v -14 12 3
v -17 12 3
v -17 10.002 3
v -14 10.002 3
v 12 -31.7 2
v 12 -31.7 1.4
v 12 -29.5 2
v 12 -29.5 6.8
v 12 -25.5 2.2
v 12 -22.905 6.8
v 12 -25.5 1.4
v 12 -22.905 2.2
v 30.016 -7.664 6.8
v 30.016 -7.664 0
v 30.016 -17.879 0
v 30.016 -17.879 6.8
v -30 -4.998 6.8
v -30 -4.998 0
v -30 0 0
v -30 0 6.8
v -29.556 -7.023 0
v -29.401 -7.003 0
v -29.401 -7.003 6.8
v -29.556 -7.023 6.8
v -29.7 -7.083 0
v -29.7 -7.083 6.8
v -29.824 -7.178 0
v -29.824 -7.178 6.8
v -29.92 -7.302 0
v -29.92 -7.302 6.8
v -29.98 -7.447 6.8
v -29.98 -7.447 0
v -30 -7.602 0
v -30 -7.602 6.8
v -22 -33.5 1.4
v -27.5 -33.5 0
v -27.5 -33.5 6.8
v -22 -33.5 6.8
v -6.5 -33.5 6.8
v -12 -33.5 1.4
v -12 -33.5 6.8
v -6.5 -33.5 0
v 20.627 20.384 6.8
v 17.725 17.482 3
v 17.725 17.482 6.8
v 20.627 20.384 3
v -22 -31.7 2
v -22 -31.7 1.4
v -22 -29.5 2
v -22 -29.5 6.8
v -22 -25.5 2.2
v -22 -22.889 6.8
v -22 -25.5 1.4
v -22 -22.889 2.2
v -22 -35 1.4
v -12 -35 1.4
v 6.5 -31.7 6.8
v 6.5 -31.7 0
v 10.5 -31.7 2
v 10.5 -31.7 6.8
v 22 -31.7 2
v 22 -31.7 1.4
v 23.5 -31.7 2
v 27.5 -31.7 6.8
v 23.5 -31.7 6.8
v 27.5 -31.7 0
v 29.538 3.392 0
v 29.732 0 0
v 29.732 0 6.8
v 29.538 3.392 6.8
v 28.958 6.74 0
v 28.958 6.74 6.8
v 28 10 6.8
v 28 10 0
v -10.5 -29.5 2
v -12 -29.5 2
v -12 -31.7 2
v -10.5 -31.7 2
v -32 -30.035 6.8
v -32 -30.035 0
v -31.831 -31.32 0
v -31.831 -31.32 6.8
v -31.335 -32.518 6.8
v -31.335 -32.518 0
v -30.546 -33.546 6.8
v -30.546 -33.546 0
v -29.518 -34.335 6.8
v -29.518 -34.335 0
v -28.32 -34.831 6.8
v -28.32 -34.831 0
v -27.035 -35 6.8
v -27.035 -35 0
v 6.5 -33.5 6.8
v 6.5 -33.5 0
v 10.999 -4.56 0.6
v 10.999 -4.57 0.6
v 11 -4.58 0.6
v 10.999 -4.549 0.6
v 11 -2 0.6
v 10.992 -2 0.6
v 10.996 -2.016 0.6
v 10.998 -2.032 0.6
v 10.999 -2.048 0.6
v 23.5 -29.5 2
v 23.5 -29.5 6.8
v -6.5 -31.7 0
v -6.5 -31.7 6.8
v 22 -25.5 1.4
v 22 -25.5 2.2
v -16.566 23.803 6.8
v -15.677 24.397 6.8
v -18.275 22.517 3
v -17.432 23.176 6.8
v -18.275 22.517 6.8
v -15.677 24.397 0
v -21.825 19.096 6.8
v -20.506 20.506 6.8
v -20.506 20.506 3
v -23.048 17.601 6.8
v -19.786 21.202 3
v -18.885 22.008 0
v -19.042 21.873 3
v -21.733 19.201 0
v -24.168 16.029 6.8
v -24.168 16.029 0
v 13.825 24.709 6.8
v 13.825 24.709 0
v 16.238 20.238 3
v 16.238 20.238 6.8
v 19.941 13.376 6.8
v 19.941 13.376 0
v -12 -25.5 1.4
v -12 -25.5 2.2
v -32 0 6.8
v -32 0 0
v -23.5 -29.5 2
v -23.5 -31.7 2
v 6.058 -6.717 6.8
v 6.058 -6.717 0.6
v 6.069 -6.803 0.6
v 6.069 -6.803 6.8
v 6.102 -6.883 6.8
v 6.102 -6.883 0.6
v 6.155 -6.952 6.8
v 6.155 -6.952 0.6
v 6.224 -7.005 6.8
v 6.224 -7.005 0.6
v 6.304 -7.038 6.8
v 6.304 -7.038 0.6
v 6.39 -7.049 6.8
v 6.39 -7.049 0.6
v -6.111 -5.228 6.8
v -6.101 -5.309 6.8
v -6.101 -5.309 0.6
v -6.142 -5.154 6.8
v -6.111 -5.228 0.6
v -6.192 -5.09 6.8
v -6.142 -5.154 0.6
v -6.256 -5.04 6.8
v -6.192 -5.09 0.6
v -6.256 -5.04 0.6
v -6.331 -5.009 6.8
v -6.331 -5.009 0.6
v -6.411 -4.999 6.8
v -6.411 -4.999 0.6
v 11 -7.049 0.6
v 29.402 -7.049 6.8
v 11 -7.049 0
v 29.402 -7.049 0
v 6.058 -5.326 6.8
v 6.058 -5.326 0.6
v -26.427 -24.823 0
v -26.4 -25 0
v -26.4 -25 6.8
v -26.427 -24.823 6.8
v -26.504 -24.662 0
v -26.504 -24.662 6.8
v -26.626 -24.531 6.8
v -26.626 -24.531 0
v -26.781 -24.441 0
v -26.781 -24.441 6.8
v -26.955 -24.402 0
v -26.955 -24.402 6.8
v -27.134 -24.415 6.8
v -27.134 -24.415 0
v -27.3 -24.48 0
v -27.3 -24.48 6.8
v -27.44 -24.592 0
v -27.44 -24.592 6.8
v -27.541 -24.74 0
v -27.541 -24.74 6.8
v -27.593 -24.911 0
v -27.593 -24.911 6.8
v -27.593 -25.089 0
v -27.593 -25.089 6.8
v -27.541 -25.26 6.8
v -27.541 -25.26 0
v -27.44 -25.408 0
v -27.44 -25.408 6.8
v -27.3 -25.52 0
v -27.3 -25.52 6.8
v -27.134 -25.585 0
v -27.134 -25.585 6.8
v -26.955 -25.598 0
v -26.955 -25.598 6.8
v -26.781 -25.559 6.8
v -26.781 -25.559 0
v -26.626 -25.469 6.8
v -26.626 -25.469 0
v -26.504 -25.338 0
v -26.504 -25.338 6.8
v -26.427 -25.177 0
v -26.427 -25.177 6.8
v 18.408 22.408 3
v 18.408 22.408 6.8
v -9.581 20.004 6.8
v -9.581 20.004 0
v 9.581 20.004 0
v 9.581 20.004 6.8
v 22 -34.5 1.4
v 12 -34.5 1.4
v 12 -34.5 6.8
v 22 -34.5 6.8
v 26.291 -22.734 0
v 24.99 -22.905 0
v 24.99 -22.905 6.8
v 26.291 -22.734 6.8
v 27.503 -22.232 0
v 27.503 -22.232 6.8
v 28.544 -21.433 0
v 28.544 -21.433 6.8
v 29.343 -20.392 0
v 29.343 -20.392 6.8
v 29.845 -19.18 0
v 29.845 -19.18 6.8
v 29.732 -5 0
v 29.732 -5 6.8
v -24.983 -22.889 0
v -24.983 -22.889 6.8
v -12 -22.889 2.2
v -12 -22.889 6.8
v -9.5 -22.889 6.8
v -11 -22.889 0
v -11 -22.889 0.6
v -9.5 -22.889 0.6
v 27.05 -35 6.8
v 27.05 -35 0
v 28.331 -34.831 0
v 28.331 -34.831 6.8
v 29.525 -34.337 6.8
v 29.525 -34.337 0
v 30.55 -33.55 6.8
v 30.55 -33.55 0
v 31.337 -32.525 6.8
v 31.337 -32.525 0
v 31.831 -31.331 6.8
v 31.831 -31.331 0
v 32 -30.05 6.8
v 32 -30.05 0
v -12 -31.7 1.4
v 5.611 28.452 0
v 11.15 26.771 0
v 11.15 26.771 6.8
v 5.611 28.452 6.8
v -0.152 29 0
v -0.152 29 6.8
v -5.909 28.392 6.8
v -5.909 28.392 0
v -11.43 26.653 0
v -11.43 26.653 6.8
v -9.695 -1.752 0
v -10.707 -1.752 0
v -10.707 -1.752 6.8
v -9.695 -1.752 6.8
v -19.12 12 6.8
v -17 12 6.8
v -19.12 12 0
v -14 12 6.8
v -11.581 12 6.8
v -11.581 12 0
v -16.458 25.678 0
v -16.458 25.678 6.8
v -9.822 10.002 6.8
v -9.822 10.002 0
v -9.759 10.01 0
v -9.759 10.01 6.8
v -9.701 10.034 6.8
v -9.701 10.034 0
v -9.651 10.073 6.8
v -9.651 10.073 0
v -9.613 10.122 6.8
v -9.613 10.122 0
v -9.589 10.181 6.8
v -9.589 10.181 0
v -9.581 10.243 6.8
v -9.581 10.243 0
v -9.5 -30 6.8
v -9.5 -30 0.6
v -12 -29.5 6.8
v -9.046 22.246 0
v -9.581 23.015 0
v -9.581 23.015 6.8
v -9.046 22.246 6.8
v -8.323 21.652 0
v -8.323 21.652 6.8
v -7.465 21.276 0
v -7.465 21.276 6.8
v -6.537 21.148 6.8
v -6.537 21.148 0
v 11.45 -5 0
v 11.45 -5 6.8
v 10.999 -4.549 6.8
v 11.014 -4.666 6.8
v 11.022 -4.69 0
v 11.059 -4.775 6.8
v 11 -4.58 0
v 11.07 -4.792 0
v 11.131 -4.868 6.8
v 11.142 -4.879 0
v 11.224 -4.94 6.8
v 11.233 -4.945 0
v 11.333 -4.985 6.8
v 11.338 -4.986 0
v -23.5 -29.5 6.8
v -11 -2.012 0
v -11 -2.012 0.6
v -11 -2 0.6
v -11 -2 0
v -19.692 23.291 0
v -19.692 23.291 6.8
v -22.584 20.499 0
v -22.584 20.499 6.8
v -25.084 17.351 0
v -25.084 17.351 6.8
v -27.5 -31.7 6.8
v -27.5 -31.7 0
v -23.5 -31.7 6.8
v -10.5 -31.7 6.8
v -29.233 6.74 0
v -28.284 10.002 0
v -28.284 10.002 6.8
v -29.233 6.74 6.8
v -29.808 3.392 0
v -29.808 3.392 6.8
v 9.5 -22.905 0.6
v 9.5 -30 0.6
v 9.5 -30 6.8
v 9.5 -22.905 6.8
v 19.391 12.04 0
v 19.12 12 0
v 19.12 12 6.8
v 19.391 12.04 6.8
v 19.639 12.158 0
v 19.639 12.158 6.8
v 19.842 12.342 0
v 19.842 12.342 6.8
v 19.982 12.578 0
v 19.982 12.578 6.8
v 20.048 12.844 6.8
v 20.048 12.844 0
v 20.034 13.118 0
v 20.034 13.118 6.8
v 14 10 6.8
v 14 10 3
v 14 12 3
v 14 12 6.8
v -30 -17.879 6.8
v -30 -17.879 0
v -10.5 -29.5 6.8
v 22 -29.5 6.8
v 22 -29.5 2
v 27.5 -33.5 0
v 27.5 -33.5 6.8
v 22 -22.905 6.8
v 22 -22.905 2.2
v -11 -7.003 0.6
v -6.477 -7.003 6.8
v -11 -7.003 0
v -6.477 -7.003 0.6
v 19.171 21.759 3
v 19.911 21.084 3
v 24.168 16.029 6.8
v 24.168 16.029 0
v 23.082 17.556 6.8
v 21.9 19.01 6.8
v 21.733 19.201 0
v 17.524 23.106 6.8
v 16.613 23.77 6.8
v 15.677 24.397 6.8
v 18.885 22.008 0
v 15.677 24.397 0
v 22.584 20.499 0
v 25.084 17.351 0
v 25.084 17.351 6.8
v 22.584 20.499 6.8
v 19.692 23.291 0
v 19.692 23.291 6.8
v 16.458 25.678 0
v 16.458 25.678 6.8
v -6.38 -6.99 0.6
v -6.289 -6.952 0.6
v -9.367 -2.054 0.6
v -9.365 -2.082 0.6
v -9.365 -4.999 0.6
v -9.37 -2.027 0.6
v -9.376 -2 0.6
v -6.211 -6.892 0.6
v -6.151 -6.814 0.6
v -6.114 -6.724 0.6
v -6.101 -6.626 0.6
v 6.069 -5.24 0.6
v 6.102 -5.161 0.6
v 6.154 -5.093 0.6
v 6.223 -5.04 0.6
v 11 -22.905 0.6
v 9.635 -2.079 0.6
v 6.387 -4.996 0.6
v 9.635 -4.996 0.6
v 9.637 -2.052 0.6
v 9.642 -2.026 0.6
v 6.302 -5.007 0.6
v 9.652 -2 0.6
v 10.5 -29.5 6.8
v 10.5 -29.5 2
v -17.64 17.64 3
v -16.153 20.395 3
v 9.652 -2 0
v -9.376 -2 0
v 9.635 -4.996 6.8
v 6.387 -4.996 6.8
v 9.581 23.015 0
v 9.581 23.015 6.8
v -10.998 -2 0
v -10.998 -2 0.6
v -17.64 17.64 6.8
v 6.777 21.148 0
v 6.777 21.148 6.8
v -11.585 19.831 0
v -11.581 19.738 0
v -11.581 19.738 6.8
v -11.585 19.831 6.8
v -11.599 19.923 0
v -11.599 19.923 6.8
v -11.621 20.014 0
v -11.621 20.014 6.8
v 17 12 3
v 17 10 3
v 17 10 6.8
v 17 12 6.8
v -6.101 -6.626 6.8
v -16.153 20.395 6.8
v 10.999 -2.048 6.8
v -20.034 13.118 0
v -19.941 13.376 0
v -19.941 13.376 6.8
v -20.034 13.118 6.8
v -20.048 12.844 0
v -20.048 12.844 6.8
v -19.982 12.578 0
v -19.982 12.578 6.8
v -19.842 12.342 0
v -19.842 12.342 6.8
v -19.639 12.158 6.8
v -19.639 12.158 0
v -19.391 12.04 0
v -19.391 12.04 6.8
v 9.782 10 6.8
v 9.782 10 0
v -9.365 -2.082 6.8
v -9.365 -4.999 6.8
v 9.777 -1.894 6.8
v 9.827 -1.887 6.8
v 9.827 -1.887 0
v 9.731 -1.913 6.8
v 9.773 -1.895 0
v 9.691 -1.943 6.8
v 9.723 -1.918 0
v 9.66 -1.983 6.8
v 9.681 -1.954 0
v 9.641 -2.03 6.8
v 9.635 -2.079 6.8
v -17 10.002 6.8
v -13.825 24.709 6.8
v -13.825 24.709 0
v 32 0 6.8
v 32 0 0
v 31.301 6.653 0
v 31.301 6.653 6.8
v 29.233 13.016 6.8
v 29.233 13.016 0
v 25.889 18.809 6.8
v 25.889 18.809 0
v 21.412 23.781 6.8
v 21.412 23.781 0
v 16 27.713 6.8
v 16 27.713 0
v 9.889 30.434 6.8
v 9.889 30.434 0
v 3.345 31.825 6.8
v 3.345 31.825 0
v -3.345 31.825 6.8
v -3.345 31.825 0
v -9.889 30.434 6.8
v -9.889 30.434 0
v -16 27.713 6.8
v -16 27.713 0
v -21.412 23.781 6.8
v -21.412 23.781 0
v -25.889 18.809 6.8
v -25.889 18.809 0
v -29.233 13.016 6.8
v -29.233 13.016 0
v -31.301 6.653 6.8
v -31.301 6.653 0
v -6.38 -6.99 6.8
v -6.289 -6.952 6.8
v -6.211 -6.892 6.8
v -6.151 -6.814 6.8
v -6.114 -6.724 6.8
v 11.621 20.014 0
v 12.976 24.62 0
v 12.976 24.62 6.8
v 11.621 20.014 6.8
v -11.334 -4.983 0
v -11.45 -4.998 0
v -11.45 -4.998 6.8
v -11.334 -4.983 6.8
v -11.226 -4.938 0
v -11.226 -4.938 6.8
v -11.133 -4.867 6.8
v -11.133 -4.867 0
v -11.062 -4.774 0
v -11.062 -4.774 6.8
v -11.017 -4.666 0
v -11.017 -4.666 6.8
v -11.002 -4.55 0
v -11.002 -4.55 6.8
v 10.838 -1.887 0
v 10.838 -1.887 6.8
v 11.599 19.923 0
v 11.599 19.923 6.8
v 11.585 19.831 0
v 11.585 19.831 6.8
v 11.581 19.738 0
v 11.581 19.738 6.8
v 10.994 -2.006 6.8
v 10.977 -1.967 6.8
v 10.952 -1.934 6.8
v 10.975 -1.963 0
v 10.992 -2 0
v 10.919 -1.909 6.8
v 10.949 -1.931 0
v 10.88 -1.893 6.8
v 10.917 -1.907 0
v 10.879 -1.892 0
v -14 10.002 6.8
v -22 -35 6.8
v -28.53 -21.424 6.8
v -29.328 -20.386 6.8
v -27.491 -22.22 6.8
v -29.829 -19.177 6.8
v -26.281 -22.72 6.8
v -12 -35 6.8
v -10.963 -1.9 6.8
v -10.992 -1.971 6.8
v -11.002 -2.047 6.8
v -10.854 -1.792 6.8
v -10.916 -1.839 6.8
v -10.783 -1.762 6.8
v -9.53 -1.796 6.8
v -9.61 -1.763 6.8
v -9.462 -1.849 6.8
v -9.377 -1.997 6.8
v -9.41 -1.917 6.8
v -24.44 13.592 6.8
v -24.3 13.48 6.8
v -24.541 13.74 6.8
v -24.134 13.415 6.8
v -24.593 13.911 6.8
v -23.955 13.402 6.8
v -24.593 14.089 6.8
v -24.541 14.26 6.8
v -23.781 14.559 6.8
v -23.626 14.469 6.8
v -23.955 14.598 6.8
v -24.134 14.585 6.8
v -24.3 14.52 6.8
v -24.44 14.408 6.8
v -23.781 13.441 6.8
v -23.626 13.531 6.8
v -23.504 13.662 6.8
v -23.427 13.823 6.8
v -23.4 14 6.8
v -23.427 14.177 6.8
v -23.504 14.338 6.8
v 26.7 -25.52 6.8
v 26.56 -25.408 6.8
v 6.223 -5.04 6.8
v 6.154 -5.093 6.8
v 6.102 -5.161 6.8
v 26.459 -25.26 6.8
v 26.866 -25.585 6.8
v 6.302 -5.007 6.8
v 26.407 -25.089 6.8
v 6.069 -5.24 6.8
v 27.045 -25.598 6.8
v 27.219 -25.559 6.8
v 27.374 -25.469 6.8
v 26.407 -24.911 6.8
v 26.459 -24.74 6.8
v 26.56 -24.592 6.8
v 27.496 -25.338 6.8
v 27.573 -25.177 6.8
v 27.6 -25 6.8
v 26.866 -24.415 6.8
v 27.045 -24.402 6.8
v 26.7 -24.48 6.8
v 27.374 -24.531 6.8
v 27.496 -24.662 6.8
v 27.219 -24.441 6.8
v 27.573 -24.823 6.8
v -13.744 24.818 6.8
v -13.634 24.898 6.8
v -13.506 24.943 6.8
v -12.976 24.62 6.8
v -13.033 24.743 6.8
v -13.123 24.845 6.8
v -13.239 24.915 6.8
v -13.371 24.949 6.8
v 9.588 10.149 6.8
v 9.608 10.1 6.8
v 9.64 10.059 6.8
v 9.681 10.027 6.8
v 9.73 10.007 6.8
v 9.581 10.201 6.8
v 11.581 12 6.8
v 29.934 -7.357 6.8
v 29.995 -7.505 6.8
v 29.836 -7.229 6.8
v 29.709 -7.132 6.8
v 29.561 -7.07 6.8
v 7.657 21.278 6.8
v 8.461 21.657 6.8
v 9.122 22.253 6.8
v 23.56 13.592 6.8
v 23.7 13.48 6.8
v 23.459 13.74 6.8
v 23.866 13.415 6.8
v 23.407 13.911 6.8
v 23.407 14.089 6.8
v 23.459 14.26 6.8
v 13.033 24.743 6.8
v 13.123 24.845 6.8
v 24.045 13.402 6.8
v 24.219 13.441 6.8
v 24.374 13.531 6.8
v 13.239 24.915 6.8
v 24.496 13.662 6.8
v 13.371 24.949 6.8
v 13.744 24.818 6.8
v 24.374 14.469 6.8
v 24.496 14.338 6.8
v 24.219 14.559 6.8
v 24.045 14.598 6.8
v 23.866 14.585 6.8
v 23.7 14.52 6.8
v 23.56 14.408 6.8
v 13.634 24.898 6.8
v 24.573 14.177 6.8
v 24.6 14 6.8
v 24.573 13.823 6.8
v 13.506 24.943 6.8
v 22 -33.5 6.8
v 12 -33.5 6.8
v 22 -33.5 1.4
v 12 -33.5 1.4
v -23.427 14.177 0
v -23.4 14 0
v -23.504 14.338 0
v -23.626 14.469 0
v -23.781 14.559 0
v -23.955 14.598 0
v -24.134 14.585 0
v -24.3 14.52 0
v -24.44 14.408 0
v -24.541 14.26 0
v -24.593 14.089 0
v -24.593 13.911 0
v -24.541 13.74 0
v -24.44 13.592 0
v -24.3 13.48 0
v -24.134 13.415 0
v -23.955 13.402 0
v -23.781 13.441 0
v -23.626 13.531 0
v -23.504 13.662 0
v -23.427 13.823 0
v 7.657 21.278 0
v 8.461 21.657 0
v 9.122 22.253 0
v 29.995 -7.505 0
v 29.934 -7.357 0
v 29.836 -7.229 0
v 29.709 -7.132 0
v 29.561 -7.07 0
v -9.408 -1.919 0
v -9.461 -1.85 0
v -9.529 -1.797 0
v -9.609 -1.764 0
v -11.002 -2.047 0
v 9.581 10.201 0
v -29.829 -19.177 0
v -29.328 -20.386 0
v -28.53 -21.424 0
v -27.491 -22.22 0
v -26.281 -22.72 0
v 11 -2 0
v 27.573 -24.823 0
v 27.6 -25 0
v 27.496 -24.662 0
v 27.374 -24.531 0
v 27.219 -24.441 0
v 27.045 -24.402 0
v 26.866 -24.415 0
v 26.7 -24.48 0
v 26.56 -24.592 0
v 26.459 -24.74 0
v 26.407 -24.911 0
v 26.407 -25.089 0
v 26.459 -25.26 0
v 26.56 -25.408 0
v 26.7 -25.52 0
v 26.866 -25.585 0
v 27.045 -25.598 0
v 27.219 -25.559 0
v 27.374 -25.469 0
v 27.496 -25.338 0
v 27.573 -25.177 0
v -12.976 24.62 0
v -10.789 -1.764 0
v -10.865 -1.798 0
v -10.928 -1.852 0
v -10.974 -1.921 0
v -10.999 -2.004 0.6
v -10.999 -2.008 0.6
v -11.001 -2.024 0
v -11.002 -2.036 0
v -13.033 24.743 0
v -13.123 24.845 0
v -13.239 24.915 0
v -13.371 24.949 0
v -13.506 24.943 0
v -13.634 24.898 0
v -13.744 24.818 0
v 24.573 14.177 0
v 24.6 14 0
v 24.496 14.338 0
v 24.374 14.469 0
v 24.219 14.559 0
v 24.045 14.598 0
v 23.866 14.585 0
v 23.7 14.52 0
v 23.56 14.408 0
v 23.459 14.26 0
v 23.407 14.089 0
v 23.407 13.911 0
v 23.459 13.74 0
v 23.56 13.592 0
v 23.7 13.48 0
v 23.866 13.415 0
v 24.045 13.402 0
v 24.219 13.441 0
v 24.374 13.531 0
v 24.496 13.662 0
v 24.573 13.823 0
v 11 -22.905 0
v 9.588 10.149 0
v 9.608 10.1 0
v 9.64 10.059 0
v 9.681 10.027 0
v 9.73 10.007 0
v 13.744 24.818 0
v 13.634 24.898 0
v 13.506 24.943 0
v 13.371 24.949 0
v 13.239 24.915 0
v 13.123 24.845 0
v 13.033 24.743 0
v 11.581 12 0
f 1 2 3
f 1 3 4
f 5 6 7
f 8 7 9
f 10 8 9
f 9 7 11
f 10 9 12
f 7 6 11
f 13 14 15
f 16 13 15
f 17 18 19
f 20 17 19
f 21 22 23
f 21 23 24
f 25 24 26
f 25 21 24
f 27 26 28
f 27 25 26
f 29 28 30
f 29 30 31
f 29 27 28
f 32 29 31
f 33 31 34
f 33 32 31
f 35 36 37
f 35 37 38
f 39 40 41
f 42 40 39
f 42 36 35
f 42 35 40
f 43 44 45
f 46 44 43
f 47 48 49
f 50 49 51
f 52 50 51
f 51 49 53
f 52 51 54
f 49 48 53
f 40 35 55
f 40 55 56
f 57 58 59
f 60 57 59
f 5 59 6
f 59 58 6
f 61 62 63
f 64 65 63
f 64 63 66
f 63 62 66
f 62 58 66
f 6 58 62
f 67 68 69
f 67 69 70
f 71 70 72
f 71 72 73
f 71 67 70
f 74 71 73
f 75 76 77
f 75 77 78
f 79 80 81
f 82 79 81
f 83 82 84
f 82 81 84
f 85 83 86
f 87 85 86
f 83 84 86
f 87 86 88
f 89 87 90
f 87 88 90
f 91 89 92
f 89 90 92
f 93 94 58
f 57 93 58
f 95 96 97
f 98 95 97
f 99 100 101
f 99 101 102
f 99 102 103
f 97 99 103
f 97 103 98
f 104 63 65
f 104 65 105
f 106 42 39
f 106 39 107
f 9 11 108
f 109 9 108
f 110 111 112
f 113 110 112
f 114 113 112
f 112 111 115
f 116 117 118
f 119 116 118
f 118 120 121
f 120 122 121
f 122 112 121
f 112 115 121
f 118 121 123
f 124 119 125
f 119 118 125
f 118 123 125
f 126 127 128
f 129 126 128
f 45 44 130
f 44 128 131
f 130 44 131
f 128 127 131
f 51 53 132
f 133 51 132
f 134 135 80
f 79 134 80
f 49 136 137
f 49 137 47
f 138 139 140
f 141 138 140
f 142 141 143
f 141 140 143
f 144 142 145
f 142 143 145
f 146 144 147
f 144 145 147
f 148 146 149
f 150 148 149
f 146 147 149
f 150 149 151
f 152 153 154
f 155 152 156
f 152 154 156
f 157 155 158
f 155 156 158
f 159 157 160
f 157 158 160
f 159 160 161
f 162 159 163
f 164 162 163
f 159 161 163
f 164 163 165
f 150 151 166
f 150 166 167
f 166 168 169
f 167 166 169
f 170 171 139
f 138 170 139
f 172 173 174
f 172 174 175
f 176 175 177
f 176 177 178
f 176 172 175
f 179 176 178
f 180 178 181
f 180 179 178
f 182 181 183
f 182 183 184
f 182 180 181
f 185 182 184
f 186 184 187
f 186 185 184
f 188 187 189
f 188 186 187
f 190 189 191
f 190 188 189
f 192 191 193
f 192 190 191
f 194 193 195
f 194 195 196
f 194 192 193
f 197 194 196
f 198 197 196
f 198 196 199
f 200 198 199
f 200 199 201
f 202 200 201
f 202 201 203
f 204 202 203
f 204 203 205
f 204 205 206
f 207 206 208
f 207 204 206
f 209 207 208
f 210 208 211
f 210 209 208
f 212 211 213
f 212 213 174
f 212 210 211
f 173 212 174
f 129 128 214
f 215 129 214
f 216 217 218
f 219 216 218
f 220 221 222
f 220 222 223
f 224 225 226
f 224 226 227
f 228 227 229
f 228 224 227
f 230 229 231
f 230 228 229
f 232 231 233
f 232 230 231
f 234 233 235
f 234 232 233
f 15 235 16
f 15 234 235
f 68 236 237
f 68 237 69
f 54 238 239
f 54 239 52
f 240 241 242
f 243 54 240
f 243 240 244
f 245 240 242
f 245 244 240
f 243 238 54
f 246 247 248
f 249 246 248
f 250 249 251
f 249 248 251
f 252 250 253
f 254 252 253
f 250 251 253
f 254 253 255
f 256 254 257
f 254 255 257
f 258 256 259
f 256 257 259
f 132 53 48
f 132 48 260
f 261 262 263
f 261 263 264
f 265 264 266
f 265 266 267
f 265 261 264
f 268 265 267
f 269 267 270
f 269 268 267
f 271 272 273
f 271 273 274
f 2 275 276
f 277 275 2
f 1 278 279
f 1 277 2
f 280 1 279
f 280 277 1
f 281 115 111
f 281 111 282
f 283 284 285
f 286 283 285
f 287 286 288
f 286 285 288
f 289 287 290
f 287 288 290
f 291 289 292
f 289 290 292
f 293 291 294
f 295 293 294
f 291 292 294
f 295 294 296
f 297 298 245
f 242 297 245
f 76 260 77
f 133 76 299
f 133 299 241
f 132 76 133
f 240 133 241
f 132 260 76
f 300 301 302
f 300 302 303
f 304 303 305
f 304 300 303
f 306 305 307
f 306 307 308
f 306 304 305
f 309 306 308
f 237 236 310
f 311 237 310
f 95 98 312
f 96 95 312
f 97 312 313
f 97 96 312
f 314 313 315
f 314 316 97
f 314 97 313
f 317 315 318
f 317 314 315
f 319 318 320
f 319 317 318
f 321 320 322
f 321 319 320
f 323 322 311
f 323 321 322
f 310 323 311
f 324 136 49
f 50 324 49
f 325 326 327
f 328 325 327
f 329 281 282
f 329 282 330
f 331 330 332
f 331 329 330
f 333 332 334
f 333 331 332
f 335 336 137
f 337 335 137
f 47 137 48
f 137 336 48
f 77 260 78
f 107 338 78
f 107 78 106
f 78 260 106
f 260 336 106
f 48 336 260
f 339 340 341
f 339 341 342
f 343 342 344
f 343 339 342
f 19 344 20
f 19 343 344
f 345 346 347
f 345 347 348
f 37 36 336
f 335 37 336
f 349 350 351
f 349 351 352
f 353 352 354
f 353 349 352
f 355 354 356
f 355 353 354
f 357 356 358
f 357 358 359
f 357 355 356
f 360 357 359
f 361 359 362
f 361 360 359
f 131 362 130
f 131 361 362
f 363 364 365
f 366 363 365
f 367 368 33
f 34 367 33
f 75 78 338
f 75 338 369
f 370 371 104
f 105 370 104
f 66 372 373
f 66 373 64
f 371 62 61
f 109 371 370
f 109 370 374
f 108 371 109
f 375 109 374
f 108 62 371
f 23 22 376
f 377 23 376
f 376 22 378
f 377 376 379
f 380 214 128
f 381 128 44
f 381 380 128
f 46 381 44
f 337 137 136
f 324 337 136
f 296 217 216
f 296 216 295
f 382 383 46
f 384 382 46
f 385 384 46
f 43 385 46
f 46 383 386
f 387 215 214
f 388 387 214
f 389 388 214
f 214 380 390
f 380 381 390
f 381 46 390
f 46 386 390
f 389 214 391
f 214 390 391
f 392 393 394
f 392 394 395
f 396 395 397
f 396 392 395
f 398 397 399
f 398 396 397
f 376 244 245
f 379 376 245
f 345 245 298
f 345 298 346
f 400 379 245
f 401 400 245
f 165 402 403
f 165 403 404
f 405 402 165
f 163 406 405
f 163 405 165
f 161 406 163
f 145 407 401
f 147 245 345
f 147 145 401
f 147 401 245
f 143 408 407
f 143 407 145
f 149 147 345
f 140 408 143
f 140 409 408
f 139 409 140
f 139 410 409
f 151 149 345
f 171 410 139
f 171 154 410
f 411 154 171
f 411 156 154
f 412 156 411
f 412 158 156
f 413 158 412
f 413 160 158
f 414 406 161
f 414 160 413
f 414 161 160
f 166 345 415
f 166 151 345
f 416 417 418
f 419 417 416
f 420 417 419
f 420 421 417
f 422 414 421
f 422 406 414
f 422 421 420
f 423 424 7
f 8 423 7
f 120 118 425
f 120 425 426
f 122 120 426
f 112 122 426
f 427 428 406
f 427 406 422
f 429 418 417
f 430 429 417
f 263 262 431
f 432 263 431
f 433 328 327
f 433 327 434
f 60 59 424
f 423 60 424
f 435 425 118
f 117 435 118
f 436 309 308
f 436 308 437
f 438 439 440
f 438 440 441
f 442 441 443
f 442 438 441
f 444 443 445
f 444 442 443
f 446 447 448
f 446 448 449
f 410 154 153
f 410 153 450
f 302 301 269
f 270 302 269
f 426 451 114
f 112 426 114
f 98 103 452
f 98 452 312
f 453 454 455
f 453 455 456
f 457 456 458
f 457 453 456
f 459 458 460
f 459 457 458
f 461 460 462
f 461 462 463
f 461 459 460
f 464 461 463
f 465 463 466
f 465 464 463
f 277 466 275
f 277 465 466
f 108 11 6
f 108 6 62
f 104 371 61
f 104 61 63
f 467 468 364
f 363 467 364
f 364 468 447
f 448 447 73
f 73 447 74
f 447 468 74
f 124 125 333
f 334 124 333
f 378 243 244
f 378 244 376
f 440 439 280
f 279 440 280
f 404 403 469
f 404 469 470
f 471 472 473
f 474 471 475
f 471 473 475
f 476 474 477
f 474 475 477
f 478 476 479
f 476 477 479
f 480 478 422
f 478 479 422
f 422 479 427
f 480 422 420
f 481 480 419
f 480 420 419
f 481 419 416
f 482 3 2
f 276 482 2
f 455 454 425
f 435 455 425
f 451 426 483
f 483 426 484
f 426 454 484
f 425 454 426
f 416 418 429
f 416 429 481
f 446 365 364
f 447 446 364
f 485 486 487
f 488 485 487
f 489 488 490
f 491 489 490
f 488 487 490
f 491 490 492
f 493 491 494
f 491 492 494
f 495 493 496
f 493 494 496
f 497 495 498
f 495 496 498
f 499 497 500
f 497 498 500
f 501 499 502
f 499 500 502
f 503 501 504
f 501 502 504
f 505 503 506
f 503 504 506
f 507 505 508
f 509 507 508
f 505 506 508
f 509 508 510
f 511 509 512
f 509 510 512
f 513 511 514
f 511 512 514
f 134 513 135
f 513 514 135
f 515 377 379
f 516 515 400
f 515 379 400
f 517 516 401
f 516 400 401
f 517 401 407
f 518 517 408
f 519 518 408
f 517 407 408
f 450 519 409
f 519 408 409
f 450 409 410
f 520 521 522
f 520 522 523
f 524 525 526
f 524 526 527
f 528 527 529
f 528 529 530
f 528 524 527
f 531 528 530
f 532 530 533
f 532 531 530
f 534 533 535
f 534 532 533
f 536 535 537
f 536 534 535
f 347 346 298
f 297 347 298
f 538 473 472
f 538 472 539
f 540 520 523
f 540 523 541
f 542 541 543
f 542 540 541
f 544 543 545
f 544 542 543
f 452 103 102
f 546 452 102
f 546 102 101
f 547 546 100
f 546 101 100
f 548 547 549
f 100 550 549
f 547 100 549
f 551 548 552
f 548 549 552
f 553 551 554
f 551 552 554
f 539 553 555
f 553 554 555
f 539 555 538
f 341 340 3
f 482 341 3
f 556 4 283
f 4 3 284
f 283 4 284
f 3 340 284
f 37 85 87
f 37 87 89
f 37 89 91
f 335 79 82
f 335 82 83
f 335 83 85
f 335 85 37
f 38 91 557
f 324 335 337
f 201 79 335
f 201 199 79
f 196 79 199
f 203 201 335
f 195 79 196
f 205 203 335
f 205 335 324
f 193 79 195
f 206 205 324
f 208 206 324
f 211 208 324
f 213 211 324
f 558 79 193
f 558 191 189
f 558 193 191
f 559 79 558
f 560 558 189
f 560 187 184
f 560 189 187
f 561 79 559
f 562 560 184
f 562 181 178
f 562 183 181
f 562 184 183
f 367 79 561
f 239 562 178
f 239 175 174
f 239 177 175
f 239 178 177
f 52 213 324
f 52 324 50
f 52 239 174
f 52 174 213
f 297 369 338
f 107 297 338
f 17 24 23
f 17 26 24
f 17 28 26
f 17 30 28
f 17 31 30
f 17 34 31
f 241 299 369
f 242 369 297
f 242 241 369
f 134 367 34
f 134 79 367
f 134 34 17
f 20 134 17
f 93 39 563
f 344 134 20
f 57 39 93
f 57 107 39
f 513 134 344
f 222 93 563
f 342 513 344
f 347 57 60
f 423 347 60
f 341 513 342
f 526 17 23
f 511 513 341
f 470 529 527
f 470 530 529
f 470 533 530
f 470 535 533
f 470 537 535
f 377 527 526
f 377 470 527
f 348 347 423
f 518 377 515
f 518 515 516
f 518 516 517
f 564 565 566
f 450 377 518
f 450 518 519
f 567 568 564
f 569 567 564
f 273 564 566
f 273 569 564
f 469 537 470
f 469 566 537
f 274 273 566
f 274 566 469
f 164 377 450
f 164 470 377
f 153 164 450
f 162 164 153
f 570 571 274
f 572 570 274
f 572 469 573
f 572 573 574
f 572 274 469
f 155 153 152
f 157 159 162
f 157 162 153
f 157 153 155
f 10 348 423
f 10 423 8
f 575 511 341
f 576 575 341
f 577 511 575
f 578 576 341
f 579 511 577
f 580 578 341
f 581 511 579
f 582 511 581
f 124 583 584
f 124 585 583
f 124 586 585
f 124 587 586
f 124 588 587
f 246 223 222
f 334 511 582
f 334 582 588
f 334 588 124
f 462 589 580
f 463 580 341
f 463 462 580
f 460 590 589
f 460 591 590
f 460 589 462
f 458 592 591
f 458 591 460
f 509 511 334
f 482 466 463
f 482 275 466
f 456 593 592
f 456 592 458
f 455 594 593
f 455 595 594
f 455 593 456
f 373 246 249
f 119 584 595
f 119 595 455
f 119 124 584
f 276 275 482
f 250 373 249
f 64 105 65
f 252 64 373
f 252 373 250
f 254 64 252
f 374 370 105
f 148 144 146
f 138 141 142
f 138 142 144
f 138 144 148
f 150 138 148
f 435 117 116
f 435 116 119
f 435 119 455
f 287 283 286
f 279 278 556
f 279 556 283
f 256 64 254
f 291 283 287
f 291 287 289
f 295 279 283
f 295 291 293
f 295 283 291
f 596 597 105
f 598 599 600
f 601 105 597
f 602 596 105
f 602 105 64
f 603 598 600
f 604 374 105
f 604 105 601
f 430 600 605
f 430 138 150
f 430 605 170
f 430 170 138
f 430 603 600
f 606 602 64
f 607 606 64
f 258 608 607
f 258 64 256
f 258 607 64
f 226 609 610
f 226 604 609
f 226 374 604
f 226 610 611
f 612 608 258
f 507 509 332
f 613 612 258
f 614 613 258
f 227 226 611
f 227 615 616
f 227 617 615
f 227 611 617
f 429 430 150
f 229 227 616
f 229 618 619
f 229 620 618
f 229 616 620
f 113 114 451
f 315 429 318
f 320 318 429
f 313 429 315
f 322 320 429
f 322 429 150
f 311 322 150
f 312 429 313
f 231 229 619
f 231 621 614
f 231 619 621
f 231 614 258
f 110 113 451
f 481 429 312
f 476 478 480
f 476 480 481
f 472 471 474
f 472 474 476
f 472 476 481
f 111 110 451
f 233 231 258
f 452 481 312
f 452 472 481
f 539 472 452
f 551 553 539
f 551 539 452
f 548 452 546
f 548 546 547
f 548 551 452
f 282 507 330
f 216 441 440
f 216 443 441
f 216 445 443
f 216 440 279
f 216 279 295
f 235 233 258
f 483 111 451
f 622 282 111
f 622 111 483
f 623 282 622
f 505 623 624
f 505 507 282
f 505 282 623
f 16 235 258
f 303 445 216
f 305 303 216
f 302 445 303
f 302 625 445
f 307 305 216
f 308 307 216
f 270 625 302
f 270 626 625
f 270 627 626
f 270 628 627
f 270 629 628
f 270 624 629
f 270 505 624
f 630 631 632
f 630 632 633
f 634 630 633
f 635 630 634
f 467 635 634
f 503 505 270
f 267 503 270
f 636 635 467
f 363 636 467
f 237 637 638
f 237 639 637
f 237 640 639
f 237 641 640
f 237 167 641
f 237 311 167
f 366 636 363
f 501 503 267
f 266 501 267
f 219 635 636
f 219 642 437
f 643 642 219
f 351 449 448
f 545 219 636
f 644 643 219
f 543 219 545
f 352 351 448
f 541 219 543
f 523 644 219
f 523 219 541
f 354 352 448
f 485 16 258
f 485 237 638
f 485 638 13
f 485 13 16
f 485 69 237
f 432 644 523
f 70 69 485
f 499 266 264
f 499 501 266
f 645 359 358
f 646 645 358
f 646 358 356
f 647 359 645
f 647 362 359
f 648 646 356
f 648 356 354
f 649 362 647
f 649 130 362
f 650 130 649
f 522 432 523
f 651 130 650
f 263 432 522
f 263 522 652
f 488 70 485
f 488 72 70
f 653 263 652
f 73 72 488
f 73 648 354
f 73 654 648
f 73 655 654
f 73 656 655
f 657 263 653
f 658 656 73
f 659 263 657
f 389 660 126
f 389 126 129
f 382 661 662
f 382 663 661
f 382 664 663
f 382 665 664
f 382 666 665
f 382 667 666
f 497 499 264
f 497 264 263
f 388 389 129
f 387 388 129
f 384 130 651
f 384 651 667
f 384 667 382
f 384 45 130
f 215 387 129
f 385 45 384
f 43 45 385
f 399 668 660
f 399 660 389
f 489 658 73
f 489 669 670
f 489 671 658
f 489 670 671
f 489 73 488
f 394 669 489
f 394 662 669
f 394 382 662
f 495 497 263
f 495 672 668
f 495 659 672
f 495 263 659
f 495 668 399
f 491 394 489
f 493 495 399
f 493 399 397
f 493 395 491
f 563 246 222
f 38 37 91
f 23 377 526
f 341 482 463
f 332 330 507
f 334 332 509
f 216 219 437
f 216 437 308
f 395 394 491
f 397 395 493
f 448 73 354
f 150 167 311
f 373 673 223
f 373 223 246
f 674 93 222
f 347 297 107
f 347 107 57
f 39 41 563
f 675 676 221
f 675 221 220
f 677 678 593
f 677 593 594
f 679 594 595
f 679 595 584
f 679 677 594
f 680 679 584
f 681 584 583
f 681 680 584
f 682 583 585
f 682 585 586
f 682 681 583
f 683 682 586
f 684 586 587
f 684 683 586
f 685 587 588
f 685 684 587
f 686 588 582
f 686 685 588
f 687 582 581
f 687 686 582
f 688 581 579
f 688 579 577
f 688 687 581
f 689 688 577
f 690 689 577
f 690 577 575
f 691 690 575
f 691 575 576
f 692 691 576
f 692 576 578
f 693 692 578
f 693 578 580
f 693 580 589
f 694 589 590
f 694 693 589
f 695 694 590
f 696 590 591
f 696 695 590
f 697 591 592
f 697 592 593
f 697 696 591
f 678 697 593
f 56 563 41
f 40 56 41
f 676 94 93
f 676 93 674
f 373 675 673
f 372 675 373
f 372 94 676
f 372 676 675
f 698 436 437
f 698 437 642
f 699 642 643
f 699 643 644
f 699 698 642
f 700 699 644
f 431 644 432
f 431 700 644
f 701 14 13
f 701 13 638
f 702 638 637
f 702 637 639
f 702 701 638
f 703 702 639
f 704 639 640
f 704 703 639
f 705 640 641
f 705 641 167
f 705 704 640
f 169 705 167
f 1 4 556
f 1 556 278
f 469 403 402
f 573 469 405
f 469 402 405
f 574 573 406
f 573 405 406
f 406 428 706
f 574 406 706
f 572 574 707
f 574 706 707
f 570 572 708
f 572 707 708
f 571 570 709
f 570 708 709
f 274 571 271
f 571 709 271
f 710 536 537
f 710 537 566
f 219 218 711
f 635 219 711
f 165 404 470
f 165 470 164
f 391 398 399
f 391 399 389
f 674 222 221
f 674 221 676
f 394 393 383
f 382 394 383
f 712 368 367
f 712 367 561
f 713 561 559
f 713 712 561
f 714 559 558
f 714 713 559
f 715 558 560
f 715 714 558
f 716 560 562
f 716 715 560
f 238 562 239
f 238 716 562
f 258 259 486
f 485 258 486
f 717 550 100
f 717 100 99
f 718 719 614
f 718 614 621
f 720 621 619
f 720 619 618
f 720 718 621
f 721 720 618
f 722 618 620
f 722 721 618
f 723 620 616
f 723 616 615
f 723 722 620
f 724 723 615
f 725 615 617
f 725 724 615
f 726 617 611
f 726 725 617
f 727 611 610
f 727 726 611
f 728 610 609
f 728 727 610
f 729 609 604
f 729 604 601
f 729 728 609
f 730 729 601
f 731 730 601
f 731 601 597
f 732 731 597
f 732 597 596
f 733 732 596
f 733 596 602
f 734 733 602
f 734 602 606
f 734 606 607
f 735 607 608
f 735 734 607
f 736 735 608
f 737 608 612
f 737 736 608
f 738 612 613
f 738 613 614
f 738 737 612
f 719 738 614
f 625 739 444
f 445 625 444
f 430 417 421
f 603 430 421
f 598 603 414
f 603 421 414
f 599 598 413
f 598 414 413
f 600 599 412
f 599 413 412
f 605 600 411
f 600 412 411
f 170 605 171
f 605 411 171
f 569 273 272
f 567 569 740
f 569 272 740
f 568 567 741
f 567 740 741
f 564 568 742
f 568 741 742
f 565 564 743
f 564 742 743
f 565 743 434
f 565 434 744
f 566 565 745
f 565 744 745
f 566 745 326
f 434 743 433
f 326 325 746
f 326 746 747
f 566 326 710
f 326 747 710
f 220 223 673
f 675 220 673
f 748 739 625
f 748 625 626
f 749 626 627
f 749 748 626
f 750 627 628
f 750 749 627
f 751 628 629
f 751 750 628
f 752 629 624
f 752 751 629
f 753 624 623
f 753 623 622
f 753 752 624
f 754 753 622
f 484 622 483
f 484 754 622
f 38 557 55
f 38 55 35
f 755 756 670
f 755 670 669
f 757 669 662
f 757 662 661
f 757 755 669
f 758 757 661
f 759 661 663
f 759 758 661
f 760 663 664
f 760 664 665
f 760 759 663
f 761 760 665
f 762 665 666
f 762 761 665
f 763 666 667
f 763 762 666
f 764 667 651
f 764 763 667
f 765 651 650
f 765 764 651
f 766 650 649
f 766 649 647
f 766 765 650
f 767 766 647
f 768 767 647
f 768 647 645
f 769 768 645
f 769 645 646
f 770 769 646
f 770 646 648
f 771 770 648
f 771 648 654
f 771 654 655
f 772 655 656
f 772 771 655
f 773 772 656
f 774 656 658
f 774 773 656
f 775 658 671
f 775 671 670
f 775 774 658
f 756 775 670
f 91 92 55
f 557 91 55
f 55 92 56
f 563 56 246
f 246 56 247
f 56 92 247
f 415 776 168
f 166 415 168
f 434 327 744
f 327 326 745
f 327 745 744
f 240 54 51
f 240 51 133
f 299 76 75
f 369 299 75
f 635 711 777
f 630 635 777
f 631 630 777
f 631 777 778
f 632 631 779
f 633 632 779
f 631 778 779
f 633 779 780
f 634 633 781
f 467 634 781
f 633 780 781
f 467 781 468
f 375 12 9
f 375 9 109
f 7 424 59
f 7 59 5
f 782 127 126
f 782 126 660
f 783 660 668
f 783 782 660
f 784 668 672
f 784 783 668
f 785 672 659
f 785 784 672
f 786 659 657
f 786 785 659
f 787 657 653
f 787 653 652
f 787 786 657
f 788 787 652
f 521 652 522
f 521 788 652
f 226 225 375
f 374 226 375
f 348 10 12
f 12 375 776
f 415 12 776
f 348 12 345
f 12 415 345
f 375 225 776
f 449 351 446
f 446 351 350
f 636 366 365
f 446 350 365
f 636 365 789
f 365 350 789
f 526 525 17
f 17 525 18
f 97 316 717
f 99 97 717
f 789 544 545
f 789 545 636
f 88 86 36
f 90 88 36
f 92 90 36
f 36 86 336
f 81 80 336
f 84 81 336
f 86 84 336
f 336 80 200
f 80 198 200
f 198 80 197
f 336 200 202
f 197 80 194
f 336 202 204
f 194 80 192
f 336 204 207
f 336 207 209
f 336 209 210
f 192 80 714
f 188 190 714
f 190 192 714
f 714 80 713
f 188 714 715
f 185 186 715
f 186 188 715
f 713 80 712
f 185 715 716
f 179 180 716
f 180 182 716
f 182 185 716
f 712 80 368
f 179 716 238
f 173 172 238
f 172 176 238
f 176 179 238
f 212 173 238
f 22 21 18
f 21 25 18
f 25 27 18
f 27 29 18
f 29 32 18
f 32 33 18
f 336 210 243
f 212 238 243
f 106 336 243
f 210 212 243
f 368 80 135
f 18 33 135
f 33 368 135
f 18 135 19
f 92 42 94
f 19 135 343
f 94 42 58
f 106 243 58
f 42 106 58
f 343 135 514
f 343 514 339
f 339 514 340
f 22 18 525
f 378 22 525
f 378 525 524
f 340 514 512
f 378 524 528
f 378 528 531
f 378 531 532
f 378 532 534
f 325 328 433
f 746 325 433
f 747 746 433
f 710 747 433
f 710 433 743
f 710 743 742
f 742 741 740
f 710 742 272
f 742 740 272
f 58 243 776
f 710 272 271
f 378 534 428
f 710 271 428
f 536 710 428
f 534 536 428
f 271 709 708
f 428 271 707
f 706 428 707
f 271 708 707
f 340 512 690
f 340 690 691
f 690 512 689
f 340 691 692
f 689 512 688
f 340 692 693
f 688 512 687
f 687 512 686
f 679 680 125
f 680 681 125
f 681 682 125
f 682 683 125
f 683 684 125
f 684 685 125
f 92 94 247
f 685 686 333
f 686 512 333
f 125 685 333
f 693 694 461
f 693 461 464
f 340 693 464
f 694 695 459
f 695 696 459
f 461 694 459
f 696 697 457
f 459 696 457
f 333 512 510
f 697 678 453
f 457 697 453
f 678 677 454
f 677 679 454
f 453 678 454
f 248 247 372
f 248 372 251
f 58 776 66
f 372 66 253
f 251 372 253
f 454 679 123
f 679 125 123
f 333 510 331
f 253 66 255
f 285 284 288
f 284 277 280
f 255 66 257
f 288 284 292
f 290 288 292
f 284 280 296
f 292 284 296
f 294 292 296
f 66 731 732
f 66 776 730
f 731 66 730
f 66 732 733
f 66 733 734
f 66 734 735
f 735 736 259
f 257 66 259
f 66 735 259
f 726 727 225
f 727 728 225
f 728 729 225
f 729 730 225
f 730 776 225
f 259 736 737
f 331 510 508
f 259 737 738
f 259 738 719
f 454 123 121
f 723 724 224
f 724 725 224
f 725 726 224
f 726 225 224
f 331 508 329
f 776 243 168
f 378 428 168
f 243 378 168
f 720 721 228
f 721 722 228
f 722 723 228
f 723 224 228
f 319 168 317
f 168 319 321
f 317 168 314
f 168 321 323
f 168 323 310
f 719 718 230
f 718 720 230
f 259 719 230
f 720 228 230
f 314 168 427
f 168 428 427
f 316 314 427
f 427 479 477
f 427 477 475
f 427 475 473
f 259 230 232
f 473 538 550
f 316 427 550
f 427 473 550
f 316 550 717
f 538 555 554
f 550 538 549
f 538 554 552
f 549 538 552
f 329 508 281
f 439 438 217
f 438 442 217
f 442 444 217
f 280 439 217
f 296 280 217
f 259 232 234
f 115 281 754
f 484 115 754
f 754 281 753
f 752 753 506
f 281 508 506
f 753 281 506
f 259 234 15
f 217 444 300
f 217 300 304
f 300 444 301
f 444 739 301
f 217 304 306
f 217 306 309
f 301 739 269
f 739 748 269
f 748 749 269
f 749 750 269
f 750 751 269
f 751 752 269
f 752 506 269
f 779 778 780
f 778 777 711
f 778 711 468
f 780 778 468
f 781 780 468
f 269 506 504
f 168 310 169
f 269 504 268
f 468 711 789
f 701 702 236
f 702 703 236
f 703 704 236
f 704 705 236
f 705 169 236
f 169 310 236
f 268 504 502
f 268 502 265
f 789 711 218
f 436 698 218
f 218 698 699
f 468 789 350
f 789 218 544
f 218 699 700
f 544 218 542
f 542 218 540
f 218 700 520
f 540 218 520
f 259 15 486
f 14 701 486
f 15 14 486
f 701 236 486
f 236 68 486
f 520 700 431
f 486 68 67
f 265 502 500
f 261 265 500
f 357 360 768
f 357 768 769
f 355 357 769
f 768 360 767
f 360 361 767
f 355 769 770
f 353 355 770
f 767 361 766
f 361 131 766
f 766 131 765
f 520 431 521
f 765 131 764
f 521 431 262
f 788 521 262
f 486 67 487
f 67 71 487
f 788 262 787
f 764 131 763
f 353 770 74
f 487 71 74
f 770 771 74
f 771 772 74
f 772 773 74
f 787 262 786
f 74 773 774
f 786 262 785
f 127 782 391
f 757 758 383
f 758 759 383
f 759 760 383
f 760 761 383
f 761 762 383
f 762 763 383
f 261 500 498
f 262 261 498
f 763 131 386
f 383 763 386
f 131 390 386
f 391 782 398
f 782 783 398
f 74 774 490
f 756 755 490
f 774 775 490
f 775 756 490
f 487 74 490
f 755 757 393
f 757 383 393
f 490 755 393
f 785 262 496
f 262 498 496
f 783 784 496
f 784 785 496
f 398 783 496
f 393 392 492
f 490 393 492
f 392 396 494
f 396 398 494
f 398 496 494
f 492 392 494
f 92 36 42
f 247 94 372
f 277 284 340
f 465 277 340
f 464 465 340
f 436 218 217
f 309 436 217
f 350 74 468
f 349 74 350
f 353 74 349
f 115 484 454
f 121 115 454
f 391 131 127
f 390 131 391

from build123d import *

# Parameters (mm, degrees)
BOX007_W               = 3
BOX007_H               = 6
BOX007_DEPTH           = 5
BOX008_W               = 3
BOX008_H               = 10
BOX008_DEPTH           = 10
BOX008_PLACEMENT_ANGLE = 45
BOX009_W               = 3
BOX009_H               = 10
BOX009_DEPTH           = 10
BOX009_PLACEMENT_ANGLE = 45
BOX006_W               = 3
BOX006_H               = 6
BOX006_DEPTH           = 5
BOX005_W               = 12
BOX005_H               = 0.5
BOX005_DEPTH           = 6.8
BOX004_W               = 22
BOX004_H               = 29
BOX004_DEPTH           = 0.6
BOX001_W               = 10
BOX001_H               = 15
BOX001_DEPTH           = 6
BOX002_W               = 10
BOX002_H               = 10
BOX002_DEPTH           = 6
BOX003_W               = 13
BOX003_H               = 4
BOX003_DEPTH           = 6
BOX_W                  = 21
BOX_H                  = 1.8
BOX_DEPTH              = 6.8
ARRAY_X_COUNT          = 2
ARRAY_X_PITCH          = 34
SKETCH001_R            = 0.6
EXTRUDE_DEPTH          = 6.8


with BuildPart() as wire02:
    # Box007 → Box007 (new body)
    with BuildSketch(Plane(origin=(14, 8, 3), x_dir=(1, 0, 0), z_dir=(0, 0, 1))):
        with Locations((1.5, 3)):
            Rectangle(BOX007_W, BOX007_H)
    extrude(amount=BOX007_DEPTH)


with BuildPart() as wire11:
    # Box008 → Box008 (new body)
    with BuildSketch(Plane.XY):
        with Locations((1.5, 5)):
            Rectangle(BOX008_W, BOX008_H)
    extrude(amount=BOX008_DEPTH)


with BuildPart() as wire11_1:
    # Box008 placement: moved
    add(wire11.part.moved(Location((-14, 14, 3))).rotate(Axis((-14, 14, 3), (0, 0, 1)), BOX008_PLACEMENT_ANGLE))


with BuildPart() as wire12:
    # Box009 → Box009 (new body)
    with BuildSketch(Plane.XY):
        with Locations((1.5, 5)):
            Rectangle(BOX009_W, BOX009_H)
    extrude(amount=BOX009_DEPTH)


with BuildPart() as wire12_1:
    # Box009 placement: moved
    add(wire12.part.moved(Location((12, 16, 3))).rotate(Axis((12, 16, 3), (0, 0, -1)), BOX009_PLACEMENT_ANGLE))


with BuildPart() as wires:
    # Box006 → Box006 (new body)
    with BuildSketch(Plane(origin=(-17, 8, 3), x_dir=(1, 0, 0), z_dir=(0, 0, 1))):
        with Locations((1.5, 3)):
            Rectangle(BOX006_W, BOX006_H)
    extrude(amount=BOX006_DEPTH)

    # Fusion004: union wire02, wire11, wire12
    add(wire02.part)
    add(wire11_1.part)
    add(wire12_1.part)


with BuildPart() as box005:
    # Box005 → Box005 (new body)
    with BuildSketch(Plane(origin=(11, -35, 0), x_dir=(1, 0, 0), z_dir=(0, 0, 1))):
        with Locations((6, 0.25)):
            Rectangle(BOX005_W, BOX005_H)
    extrude(amount=BOX005_DEPTH)


with BuildPart() as box004:
    # Box004 → Box004 (new body)
    with BuildSketch(Plane(origin=(-11, -31, 0), x_dir=(1, 0, 0), z_dir=(0, 0, 1))):
        with Locations((11, 14.5)):
            Rectangle(BOX004_W, BOX004_H)
    extrude(amount=BOX004_DEPTH)


with BuildPart() as sch001:
    # Box001 → Box001 (new body)
    with BuildSketch(Plane(origin=(-5, 0, 2.2), x_dir=(1, 0, 0), z_dir=(0, 0, 1))):
        with Locations((5, 7.5)):
            Rectangle(BOX001_W, BOX001_H)
    extrude(amount=BOX001_DEPTH)


with BuildPart() as pin:
    # Box002 → Box002 (new body)
    with BuildSketch(Plane(origin=(-5, -2, 1.4), x_dir=(1, 0, 0), z_dir=(0, 0, 1))):
        with Locations((5, 5)):
            Rectangle(BOX002_W, BOX002_H)
    extrude(amount=BOX002_DEPTH)


with BuildPart() as solder:
    # Box003 → Box003 (new body)
    with BuildSketch(Plane(origin=(-6.5, 0, 2), x_dir=(1, 0, 0), z_dir=(0, 0, 1))):
        with Locations((6.5, 2)):
            Rectangle(BOX003_W, BOX003_H)
    extrude(amount=BOX003_DEPTH)


with BuildPart() as array:
    # Box → Box (new body)
    with BuildSketch(Plane(origin=(-10.5, 0, 0), x_dir=(1, 0, 0), z_dir=(0, 0, 1))):
        with Locations((10.5, 0.9)):
            Rectangle(BOX_W, BOX_H)
    extrude(amount=BOX_DEPTH)

    # Fusion: union sch001, pin, solder
    add(sch001.part)
    add(pin.part)
    add(solder.part)


with BuildPart() as array_1:
    # Fusion placement: moved
    add(array.part.moved(Location((-17, -33.5, 0))))

    # Array X: Array ×2


with BuildPart() as array_2:
    add(array_1.part)
    with Locations(*[(i * ARRAY_X_PITCH, 0, 0) for i in range(1, ARRAY_X_COUNT)]):
        add(array_1.part)


with BuildPart() as cut001:
    # Sketch001 → Extrude (new body)
    with BuildSketch(Plane.XY):
        with BuildLine():
            ThreePointArc((32, 0), (0, 32), (-32, 0))
            Line((-32, 0), (-32, -30.035479))
            ThreePointArc((-32, -30.035479), (-30.545926, -33.545926), (-27.035479, -35))
            Line((-27.035479, -35), (27.049982, -35))
            ThreePointArc((27.049982, -35), (30.550173, -33.550173), (32, -30.049982))
            Line((32, -30.049982), (32, 0))
        make_face()
        with Locations((-27, -25)):
            Circle(SKETCH001_R, mode=Mode.SUBTRACT)
        with Locations((27, -25)):
            Circle(SKETCH001_R, mode=Mode.SUBTRACT)
        with Locations((-24, 14)):
            Circle(SKETCH001_R, mode=Mode.SUBTRACT)
        with Locations((24, 14)):
            Circle(SKETCH001_R, mode=Mode.SUBTRACT)
        with BuildLine():
            Line((-28.283536, 10.002079), (-11.283536, 10.002079))
            Line((-9.821695, 10.002079), (-11.283536, 10.002079))
            ThreePointArc((-9.821695, 10.002079), (-9.651432, 10.072604), (-9.580907, 10.242867))
            Line((-9.580907, 20.003923), (-9.580907, 10.242867))
            Line((-9.580907, 20.003923), (9.580907, 20.003923))
            Line((9.580907, 20.003923), (9.580907, 10.20069))
            ThreePointArc((9.580907, 10.20069), (9.639688, 10.058781), (9.781597, 10))
            Line((9.781597, 10), (10.999997, 10))
            Line((10.999997, 10), (27.999997, 10))
            ThreePointArc((29.732135, 0), (29.2959, 5.074453), (27.999997, 10))
            Line((29.732135, -5), (29.732135, 0))
            Line((29.732135, -5), (11.449554, -5))
            ThreePointArc((10.998979, -4.549425), (11.130949, -4.86803), (11.449554, -5))
            Line((10.998979, -2.047611), (10.998979, -4.549425))
            ThreePointArc((10.998979, -2.047611), (10.951968, -1.934117), (10.838474, -1.887106))
            Line((9.826898, -1.887106), (10.838474, -1.887106))
            ThreePointArc((9.826898, -1.887106), (9.69096, -1.943413), (9.634653, -2.079351))
            Line((9.634653, -4.996077), (9.634653, -2.079351))
            Line((9.634653, -4.996077), (6.387418, -4.996077))
            ThreePointArc((6.387418, -4.996077), (6.154439, -5.09258), (6.057936, -5.325559))
            Line((6.057936, -5.325559), (6.057936, -6.717126))
            ThreePointArc((6.057936, -6.717126), (6.15523, -6.952016), (6.390121, -7.049311))
            Line((6.390121, -7.049311), (29.401567, -7.049311))
            ThreePointArc((30.016101, -7.663845), (29.836108, -7.229304), (29.401567, -7.049311))
            Line((30.016101, -7.663845), (30.016101, -11.257143))
            Line((30.016101, -17.879205), (30.016101, -11.257143))
            ThreePointArc((24.990135, -22.90517), (28.544029, -21.433099), (30.016101, -17.879205))
            Line((24.990135, -22.90517), (9.5, -22.90517))
            Line((9.5, -30), (9.5, -22.90517))
            Line((9.5, -30), (-9.5, -30))
            Line((-9.5, -30), (-9.5, -22.889064))
            Line((-24.982737, -22.889064), (-9.5, -22.889064))
            ThreePointArc((-30, -17.879205), (-28.530028, -21.424329), (-24.982737, -22.889064))
            Line((-30, -11.257325), (-30, -17.879205))
            Line((-30, -11.257325), (-30, -7.602077))
            ThreePointArc((-29.400597, -7.002674), (-29.824439, -7.178235), (-30, -7.602077))
            Line((-29.400597, -7.002674), (-6.477289, -7.002674))
            ThreePointArc((-6.477289, -7.002674), (-6.211158, -6.892439), (-6.100923, -6.626308))
            Line((-6.100923, -5.308623), (-6.100923, -6.626308))
            ThreePointArc((-6.100923, -5.308623), (-6.191681, -5.089514), (-6.41079, -4.998756))
            Line((-9.365347, -4.998756), (-6.41079, -4.998756))
            Line((-9.365347, -2.082029), (-9.365347, -4.998756))
            ThreePointArc((-9.365347, -2.082029), (-9.461983, -1.848728), (-9.695285, -1.752091))
            Line((-10.706861, -1.752091), (-9.695285, -1.752091))
            ThreePointArc((-10.706861, -1.752091), (-10.915611, -1.838558), (-11.002079, -2.047309))
            Line((-11.002079, -4.549979), (-11.002079, -2.047309))
            ThreePointArc((-11.450021, -4.997921), (-11.133278, -4.866722), (-11.002079, -4.549979))
            Line((-11.450021, -4.997921), (-30, -4.997921))
            Line((-30, -4.997921), (-30, 0))
            ThreePointArc((-28.283536, 10.002079), (-29.56777, 5.074146), (-30, 0))
        make_face(mode=Mode.SUBTRACT)
        with BuildLine():
            ThreePointArc((11.150322, 26.770699), (-0.151775, 28.999603), (-11.429923, 26.652521))
            Line((-9.58106, 23.01514), (-11.429923, 26.652521))
            ThreePointArc((-9.58106, 23.01514), (-8.322568, 21.651708), (-6.53689, 21.147623))
            Line((-6.53689, 21.147623), (6.776723, 21.147623))
            ThreePointArc((6.776723, 21.147623), (8.461354, 21.657225), (9.58106, 23.01514))
            Line((11.150322, 26.770699), (9.58106, 23.01514))
        make_face(mode=Mode.SUBTRACT)
        with BuildLine():
            ThreePointArc((-16.458256, 25.678314), (-21.184389, 21.942462), (-25.084031, 17.350544))
            Line((-24.167702, 16.028793), (-25.084031, 17.350544))
            ThreePointArc((-15.677322, 24.397163), (-20.357158, 20.653961), (-24.167702, 16.028793))
            Line((-15.677322, 24.397163), (-16.458256, 25.678314))
        make_face(mode=Mode.SUBTRACT)
        with BuildLine():
            ThreePointArc((25.084031, 17.350544), (21.184389, 21.942462), (16.458256, 25.678314))
            Line((16.458256, 25.678314), (15.677322, 24.397163))
            ThreePointArc((24.167702, 16.028793), (20.357158, 20.653961), (15.677322, 24.397163))
            Line((25.084031, 17.350544), (24.167702, 16.028793))
        make_face(mode=Mode.SUBTRACT)
        with BuildLine():
            Line((-11.580907, 19.737881), (-11.580907, 12))
            Line((-19.119635, 12), (-11.580907, 12))
            ThreePointArc((-19.940526, 13.375741), (-19.920653, 12.454819), (-19.119635, 12))
            Line((-19.940526, 13.375741), (-13.824918, 24.709109))
            ThreePointArc((-12.975828, 24.620182), (-13.370592, 24.948999), (-13.824918, 24.709109))
            Line((-12.975828, 24.620182), (-11.620684, 20.014015))
            ThreePointArc((-11.580907, 19.737881), (-11.590902, 19.877373), (-11.620684, 20.014015))
        make_face(mode=Mode.SUBTRACT)
        with BuildLine():
            Line((12.975828, 24.620182), (11.620684, 20.014015))
            ThreePointArc((11.620684, 20.014015), (11.590902, 19.877373), (11.580907, 19.737881))
            Line((11.580907, 19.737881), (11.580907, 12))
            Line((19.119635, 12), (11.580907, 12))
            ThreePointArc((19.119635, 12), (19.920653, 12.454819), (19.940526, 13.375741))
            Line((13.824918, 24.709109), (19.940526, 13.375741))
            ThreePointArc((13.824918, 24.709109), (13.370592, 24.948999), (12.975828, 24.620182))
        make_face(mode=Mode.SUBTRACT)
    extrude(amount=EXTRUDE_DEPTH)

    # Cut: cut Array
    add(array_2.part, mode=Mode.SUBTRACT)

    # Fusion001: union Box004
    add(box004.part)

    # Fusion003: union Box005
    add(box005.part)

    # Cut001: cut wires
    add(wires.part, mode=Mode.SUBTRACT)


solid = cut001.part
